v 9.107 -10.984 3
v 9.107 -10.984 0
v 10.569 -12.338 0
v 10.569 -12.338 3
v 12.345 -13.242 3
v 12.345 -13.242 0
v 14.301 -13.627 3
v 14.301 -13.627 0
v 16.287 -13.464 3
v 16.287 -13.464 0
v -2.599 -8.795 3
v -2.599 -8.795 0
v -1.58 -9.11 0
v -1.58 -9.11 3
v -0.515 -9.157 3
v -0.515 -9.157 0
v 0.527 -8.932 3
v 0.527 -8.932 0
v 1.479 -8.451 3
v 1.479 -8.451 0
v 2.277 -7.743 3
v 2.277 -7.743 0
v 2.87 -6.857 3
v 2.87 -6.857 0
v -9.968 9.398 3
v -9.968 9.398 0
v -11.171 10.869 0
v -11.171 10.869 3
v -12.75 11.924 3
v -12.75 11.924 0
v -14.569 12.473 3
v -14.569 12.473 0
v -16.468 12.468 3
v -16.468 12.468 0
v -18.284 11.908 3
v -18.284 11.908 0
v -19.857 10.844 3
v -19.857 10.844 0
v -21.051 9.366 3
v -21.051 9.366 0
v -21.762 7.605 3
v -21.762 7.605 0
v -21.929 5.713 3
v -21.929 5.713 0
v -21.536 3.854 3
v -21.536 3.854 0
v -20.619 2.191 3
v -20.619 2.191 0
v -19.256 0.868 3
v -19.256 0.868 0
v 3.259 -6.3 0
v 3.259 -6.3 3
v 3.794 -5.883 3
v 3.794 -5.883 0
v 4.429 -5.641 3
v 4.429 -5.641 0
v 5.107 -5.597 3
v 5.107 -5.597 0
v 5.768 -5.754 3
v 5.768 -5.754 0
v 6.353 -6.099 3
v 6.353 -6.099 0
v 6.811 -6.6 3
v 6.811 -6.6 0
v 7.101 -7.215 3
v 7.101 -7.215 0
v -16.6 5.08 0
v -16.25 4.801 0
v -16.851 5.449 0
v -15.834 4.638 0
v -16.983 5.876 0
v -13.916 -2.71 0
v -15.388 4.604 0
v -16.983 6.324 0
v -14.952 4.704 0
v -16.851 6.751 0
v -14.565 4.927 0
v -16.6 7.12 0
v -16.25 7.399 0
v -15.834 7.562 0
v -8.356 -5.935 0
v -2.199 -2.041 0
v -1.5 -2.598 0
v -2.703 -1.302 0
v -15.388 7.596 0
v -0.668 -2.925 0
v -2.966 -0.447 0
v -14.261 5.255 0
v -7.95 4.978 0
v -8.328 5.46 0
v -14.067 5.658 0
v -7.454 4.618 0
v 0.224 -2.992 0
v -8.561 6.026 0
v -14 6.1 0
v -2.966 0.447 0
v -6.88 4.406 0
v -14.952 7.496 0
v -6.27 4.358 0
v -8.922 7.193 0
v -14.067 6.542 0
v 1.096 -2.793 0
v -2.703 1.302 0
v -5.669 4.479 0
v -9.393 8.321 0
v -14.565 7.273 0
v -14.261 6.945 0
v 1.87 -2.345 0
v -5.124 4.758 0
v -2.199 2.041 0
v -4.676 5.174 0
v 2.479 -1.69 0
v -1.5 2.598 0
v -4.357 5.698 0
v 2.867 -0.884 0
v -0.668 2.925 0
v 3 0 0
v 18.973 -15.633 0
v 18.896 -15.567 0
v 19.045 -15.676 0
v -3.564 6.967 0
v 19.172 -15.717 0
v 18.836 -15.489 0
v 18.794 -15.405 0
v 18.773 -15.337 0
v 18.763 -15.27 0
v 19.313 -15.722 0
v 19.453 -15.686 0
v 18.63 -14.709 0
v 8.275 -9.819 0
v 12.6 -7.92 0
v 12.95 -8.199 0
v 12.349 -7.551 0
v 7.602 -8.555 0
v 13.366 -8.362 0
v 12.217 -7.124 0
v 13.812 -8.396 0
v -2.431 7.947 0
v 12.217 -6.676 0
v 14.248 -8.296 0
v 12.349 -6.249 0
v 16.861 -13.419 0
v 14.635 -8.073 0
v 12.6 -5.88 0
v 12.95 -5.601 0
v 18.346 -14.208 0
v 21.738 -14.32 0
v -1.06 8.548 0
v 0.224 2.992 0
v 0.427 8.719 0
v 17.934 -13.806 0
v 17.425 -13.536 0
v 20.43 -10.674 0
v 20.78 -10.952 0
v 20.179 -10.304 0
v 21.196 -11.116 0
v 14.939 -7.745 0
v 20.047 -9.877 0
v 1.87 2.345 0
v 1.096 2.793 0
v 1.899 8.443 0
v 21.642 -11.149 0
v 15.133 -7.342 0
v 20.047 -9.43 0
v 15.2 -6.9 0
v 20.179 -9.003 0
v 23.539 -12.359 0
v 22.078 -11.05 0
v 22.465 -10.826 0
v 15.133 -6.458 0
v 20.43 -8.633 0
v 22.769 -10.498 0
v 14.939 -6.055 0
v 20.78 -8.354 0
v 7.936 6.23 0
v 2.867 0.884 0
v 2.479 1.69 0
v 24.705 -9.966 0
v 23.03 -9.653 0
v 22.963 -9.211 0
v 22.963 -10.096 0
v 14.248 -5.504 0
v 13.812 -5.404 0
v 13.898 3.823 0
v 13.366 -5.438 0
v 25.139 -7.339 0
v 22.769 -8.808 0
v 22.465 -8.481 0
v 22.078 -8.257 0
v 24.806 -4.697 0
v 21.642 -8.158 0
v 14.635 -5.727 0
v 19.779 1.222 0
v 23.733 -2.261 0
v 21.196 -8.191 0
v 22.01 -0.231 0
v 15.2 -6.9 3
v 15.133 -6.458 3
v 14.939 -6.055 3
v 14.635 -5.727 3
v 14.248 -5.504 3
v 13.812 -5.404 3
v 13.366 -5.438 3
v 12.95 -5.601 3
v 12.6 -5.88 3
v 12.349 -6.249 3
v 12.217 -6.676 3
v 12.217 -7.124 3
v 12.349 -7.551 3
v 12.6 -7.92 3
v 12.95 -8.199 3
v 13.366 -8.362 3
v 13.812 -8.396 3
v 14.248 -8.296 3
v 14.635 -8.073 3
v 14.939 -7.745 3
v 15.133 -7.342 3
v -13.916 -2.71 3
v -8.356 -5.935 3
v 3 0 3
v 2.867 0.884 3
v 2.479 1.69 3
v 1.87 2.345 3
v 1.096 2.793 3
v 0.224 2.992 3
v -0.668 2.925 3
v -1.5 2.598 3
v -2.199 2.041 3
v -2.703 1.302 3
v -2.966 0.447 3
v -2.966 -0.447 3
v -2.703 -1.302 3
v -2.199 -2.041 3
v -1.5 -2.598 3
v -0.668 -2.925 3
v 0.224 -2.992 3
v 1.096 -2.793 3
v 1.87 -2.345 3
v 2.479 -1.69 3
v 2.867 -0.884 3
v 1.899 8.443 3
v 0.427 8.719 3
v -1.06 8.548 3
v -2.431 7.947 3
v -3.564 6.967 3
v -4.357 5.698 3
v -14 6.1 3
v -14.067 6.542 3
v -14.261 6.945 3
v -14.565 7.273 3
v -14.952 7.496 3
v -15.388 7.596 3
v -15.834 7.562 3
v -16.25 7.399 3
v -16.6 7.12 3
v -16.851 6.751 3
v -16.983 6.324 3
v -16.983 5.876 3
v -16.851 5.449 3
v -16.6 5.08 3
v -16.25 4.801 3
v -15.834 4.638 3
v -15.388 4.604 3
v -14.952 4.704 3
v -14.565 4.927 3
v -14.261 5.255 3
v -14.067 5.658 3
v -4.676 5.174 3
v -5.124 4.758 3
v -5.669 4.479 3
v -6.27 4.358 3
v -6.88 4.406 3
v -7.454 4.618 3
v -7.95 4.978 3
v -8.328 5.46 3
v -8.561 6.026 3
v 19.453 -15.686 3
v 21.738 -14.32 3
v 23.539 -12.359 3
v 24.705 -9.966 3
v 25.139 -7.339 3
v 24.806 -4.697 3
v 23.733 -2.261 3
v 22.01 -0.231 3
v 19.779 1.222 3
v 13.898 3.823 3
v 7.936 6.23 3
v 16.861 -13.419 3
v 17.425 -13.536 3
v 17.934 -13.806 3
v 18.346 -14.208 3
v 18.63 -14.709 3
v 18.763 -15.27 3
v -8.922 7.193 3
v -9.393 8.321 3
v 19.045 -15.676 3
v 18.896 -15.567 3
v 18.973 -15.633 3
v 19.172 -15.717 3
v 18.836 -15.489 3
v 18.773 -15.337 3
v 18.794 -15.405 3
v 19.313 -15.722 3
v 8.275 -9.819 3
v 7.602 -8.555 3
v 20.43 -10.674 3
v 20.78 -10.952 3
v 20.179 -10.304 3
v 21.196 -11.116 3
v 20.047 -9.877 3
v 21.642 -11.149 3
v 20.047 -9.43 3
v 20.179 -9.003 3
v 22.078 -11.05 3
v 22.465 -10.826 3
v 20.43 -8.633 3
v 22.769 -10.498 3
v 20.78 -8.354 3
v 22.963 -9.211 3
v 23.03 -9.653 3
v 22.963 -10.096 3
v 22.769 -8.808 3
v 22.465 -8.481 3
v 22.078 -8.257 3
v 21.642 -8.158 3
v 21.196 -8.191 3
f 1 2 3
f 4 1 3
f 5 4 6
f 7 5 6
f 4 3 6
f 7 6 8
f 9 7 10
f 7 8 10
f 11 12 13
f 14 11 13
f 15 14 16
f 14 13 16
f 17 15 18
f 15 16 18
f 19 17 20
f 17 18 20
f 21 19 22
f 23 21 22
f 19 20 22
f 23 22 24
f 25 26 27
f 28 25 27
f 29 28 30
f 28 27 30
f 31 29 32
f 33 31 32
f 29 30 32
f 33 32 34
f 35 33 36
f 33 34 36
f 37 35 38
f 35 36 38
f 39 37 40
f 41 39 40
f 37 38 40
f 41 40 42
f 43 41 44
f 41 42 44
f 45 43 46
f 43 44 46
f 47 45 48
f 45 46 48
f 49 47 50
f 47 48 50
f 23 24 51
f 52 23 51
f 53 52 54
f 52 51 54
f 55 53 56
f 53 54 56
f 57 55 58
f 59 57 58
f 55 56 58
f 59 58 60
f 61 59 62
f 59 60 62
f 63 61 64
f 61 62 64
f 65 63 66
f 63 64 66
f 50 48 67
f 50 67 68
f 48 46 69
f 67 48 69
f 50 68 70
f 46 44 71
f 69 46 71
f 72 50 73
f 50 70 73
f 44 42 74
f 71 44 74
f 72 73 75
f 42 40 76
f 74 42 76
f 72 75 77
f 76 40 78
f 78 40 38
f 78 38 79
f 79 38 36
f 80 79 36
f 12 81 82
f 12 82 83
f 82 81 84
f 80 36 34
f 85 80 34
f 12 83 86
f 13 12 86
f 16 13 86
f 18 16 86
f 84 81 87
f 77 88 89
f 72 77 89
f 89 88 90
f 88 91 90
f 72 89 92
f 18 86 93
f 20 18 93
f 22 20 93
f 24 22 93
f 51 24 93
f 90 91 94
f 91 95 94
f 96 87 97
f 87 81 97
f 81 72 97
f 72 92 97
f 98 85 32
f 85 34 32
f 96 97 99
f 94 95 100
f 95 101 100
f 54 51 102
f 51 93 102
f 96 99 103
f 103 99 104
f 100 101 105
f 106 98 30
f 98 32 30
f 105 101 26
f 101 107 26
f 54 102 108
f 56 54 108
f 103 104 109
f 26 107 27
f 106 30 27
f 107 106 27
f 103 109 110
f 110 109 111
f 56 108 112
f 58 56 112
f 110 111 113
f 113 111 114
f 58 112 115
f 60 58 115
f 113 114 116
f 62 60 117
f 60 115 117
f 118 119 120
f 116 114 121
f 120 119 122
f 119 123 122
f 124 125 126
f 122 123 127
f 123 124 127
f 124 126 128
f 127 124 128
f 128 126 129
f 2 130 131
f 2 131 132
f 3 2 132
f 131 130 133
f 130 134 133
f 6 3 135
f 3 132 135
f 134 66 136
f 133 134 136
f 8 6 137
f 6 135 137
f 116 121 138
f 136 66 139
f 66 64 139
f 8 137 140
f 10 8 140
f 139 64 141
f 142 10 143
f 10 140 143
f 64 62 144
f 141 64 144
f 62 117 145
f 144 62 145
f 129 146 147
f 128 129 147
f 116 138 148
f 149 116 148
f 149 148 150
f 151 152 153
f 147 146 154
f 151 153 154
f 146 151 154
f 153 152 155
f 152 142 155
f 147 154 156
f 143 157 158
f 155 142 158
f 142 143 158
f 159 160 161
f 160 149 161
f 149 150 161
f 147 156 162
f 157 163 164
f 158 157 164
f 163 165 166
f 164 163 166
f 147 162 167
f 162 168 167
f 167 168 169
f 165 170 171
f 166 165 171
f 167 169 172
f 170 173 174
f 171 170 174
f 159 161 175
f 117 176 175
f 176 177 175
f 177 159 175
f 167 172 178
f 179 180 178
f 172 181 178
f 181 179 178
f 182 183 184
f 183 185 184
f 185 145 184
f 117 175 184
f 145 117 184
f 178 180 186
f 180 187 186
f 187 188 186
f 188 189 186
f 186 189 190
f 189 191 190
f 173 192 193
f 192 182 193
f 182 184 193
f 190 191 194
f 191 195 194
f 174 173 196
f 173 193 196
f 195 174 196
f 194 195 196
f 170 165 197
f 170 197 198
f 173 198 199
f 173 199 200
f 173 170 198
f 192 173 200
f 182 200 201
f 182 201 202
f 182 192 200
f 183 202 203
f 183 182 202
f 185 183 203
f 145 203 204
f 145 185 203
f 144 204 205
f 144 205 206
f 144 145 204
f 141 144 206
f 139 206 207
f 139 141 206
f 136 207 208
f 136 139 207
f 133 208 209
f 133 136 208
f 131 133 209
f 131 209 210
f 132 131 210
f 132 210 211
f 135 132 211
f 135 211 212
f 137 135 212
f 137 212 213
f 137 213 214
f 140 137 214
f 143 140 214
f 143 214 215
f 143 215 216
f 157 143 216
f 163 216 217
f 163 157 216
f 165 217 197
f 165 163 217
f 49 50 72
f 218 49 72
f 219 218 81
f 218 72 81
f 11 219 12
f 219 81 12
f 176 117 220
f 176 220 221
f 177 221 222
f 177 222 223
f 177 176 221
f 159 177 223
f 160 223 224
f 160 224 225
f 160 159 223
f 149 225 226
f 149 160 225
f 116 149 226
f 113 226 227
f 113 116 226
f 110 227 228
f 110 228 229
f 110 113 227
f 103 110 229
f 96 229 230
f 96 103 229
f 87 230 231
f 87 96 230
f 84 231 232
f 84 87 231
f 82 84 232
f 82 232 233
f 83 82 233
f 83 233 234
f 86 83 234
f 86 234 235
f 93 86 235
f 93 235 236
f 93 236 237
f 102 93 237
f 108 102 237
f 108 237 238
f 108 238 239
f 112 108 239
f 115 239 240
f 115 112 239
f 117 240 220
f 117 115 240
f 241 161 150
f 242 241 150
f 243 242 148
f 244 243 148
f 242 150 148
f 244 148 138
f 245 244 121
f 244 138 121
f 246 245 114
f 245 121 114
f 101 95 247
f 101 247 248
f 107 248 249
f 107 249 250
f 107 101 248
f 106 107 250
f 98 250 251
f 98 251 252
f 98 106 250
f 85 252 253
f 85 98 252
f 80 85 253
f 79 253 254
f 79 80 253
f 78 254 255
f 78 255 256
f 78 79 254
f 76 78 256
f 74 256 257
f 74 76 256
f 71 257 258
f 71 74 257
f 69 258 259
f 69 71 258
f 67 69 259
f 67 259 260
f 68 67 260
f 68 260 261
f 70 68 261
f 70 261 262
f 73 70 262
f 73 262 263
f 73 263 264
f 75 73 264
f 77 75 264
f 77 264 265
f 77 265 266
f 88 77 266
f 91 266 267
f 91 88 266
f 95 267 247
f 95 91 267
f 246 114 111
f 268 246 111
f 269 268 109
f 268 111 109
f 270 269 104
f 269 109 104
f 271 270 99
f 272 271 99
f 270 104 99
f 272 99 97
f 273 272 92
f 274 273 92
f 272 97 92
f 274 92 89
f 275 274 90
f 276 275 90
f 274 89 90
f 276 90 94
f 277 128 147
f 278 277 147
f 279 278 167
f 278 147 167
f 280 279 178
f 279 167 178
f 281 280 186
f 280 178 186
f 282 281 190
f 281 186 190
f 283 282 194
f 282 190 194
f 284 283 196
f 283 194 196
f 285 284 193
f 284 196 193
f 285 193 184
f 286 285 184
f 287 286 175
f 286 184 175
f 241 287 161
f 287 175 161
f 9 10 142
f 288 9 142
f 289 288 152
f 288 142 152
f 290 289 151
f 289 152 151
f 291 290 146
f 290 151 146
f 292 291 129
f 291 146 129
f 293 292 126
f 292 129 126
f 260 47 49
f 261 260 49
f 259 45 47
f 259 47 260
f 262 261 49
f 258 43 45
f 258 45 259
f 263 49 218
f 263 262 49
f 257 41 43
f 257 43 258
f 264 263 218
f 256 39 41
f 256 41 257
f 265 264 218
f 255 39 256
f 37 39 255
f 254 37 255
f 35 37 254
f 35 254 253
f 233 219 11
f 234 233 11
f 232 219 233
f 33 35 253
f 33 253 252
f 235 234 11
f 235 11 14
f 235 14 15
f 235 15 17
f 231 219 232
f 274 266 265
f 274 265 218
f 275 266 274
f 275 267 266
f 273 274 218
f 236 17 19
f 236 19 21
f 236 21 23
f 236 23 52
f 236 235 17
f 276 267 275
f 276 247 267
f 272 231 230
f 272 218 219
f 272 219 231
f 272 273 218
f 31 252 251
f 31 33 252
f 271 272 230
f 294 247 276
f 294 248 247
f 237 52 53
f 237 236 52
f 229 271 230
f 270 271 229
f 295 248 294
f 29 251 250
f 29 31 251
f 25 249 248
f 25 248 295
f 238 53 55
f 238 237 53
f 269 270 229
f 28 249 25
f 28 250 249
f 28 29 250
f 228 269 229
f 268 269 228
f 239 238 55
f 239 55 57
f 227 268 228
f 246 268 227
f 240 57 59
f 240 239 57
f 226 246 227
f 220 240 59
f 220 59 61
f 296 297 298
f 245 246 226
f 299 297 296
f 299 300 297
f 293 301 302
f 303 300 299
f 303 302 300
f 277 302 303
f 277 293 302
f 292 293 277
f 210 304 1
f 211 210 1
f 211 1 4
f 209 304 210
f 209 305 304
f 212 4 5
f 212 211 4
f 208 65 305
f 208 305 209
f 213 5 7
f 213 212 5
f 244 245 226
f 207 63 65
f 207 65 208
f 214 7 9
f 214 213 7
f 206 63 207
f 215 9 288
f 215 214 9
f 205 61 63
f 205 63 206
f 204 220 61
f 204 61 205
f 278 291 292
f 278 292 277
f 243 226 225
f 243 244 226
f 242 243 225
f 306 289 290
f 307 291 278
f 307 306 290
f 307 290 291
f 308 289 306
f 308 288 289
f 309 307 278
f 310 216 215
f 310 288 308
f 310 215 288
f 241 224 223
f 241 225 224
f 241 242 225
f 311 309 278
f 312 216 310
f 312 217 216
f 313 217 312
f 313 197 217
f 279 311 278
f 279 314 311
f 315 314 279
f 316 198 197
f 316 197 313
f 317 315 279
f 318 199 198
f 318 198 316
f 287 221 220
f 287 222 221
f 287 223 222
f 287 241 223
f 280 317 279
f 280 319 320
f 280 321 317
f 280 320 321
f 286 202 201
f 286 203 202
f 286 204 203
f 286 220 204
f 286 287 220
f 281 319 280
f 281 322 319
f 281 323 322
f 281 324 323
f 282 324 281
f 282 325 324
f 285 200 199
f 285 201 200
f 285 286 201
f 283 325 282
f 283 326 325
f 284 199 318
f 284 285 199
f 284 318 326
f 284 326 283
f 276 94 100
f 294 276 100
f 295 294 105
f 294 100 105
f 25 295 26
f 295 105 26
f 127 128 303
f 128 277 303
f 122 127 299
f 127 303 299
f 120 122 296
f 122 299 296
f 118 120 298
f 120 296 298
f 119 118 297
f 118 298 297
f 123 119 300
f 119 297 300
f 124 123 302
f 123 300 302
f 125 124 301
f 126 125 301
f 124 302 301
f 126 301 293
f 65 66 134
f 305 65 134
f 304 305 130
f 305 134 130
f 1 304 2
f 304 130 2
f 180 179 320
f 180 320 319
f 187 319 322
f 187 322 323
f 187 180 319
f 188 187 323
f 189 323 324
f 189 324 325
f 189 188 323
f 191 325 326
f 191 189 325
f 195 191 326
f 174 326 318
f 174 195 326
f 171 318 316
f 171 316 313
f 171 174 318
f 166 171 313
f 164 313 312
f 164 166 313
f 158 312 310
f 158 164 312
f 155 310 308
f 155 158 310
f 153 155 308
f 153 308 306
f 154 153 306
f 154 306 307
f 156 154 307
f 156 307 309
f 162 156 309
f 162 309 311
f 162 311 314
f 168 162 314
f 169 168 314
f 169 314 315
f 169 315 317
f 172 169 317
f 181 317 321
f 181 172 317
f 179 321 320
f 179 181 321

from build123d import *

# Parameters (mm, degrees)
ESQUISSE1_R        = 3
ESQUISSE1_R_2      = 1.5
BOSS_EXTRU_1_DEPTH = 3
CONG_1_R           = 0.5


with BuildPart() as part:
    # Esquisse1 → Boss.-Extru.1 (new body)
    with BuildSketch(Plane.XY):
        with BuildLine():
            ThreePointArc((-9.967950619, 9.398353751), (-19.856771897, 10.843547876), (-19.255850538, 0.867763905))
            ThreePointArc((-19.255850538, 0.867763905), (-11.16183771, -4.367412674), (-2.599104383, -8.794569261))
            ThreePointArc((-2.599104383, -8.794569261), (0.527471635, -8.932442445), (2.869569032, -6.856613359))
            ThreePointArc((2.869569032, -6.856613359), (5.106974254, -5.597078916), (7.101036237, -7.214523181))
            ThreePointArc((7.101036237, -7.214523181), (7.91789358, -9.198392931), (9.106885228, -10.984252378))
            ThreePointArc((9.106885228, -10.984252378), (12.345329643, -13.241699917), (16.286687996, -13.463704315))
            ThreePointArc((16.286687996, -13.463704315), (18.195594291, -14.034021941), (18.707504902, -15.959413581))
            ThreePointArc((18.707504902, -15.959413581), (25.123132348, -7.73541187), (19.778982477, 1.22196173))
            ThreePointArc((19.778982477, 1.22196173), (10.927169302, 5.05077079), (1.899061951, 8.443063964))
            ThreePointArc((1.899061951, 8.443063964), (-1.768338506, 8.299023868), (-4.357336538, 5.697550659))
            ThreePointArc((-4.357336538, 5.697550659), (-6.576456411, 4.361139029), (-8.561108443, 6.025964956))
            ThreePointArc((-8.561108443, 6.025964956), (-9.144248361, 7.762336434), (-9.967950619, 9.398353751))
        make_face()
        Circle(ESQUISSE1_R, mode=Mode.SUBTRACT)
        with Locations((-15.5, 6.1)):
            Circle(ESQUISSE1_R_2, mode=Mode.SUBTRACT)
        with Locations((13.7, -6.9)):
            Circle(ESQUISSE1_R_2, mode=Mode.SUBTRACT)
        with Locations((21.53, -9.653379741)):
            Circle(ESQUISSE1_R_2, mode=Mode.SUBTRACT)
    extrude(amount=BOSS_EXTRU_1_DEPTH)

    # Congé1
    cong_1_edges = [part.edges().sort_by_distance(p)[0] for p in [
        (18.707504902, -15.959413581, 1.5),
    ]]
    fillet(cong_1_edges, radius=CONG_1_R)


solid = part.part
